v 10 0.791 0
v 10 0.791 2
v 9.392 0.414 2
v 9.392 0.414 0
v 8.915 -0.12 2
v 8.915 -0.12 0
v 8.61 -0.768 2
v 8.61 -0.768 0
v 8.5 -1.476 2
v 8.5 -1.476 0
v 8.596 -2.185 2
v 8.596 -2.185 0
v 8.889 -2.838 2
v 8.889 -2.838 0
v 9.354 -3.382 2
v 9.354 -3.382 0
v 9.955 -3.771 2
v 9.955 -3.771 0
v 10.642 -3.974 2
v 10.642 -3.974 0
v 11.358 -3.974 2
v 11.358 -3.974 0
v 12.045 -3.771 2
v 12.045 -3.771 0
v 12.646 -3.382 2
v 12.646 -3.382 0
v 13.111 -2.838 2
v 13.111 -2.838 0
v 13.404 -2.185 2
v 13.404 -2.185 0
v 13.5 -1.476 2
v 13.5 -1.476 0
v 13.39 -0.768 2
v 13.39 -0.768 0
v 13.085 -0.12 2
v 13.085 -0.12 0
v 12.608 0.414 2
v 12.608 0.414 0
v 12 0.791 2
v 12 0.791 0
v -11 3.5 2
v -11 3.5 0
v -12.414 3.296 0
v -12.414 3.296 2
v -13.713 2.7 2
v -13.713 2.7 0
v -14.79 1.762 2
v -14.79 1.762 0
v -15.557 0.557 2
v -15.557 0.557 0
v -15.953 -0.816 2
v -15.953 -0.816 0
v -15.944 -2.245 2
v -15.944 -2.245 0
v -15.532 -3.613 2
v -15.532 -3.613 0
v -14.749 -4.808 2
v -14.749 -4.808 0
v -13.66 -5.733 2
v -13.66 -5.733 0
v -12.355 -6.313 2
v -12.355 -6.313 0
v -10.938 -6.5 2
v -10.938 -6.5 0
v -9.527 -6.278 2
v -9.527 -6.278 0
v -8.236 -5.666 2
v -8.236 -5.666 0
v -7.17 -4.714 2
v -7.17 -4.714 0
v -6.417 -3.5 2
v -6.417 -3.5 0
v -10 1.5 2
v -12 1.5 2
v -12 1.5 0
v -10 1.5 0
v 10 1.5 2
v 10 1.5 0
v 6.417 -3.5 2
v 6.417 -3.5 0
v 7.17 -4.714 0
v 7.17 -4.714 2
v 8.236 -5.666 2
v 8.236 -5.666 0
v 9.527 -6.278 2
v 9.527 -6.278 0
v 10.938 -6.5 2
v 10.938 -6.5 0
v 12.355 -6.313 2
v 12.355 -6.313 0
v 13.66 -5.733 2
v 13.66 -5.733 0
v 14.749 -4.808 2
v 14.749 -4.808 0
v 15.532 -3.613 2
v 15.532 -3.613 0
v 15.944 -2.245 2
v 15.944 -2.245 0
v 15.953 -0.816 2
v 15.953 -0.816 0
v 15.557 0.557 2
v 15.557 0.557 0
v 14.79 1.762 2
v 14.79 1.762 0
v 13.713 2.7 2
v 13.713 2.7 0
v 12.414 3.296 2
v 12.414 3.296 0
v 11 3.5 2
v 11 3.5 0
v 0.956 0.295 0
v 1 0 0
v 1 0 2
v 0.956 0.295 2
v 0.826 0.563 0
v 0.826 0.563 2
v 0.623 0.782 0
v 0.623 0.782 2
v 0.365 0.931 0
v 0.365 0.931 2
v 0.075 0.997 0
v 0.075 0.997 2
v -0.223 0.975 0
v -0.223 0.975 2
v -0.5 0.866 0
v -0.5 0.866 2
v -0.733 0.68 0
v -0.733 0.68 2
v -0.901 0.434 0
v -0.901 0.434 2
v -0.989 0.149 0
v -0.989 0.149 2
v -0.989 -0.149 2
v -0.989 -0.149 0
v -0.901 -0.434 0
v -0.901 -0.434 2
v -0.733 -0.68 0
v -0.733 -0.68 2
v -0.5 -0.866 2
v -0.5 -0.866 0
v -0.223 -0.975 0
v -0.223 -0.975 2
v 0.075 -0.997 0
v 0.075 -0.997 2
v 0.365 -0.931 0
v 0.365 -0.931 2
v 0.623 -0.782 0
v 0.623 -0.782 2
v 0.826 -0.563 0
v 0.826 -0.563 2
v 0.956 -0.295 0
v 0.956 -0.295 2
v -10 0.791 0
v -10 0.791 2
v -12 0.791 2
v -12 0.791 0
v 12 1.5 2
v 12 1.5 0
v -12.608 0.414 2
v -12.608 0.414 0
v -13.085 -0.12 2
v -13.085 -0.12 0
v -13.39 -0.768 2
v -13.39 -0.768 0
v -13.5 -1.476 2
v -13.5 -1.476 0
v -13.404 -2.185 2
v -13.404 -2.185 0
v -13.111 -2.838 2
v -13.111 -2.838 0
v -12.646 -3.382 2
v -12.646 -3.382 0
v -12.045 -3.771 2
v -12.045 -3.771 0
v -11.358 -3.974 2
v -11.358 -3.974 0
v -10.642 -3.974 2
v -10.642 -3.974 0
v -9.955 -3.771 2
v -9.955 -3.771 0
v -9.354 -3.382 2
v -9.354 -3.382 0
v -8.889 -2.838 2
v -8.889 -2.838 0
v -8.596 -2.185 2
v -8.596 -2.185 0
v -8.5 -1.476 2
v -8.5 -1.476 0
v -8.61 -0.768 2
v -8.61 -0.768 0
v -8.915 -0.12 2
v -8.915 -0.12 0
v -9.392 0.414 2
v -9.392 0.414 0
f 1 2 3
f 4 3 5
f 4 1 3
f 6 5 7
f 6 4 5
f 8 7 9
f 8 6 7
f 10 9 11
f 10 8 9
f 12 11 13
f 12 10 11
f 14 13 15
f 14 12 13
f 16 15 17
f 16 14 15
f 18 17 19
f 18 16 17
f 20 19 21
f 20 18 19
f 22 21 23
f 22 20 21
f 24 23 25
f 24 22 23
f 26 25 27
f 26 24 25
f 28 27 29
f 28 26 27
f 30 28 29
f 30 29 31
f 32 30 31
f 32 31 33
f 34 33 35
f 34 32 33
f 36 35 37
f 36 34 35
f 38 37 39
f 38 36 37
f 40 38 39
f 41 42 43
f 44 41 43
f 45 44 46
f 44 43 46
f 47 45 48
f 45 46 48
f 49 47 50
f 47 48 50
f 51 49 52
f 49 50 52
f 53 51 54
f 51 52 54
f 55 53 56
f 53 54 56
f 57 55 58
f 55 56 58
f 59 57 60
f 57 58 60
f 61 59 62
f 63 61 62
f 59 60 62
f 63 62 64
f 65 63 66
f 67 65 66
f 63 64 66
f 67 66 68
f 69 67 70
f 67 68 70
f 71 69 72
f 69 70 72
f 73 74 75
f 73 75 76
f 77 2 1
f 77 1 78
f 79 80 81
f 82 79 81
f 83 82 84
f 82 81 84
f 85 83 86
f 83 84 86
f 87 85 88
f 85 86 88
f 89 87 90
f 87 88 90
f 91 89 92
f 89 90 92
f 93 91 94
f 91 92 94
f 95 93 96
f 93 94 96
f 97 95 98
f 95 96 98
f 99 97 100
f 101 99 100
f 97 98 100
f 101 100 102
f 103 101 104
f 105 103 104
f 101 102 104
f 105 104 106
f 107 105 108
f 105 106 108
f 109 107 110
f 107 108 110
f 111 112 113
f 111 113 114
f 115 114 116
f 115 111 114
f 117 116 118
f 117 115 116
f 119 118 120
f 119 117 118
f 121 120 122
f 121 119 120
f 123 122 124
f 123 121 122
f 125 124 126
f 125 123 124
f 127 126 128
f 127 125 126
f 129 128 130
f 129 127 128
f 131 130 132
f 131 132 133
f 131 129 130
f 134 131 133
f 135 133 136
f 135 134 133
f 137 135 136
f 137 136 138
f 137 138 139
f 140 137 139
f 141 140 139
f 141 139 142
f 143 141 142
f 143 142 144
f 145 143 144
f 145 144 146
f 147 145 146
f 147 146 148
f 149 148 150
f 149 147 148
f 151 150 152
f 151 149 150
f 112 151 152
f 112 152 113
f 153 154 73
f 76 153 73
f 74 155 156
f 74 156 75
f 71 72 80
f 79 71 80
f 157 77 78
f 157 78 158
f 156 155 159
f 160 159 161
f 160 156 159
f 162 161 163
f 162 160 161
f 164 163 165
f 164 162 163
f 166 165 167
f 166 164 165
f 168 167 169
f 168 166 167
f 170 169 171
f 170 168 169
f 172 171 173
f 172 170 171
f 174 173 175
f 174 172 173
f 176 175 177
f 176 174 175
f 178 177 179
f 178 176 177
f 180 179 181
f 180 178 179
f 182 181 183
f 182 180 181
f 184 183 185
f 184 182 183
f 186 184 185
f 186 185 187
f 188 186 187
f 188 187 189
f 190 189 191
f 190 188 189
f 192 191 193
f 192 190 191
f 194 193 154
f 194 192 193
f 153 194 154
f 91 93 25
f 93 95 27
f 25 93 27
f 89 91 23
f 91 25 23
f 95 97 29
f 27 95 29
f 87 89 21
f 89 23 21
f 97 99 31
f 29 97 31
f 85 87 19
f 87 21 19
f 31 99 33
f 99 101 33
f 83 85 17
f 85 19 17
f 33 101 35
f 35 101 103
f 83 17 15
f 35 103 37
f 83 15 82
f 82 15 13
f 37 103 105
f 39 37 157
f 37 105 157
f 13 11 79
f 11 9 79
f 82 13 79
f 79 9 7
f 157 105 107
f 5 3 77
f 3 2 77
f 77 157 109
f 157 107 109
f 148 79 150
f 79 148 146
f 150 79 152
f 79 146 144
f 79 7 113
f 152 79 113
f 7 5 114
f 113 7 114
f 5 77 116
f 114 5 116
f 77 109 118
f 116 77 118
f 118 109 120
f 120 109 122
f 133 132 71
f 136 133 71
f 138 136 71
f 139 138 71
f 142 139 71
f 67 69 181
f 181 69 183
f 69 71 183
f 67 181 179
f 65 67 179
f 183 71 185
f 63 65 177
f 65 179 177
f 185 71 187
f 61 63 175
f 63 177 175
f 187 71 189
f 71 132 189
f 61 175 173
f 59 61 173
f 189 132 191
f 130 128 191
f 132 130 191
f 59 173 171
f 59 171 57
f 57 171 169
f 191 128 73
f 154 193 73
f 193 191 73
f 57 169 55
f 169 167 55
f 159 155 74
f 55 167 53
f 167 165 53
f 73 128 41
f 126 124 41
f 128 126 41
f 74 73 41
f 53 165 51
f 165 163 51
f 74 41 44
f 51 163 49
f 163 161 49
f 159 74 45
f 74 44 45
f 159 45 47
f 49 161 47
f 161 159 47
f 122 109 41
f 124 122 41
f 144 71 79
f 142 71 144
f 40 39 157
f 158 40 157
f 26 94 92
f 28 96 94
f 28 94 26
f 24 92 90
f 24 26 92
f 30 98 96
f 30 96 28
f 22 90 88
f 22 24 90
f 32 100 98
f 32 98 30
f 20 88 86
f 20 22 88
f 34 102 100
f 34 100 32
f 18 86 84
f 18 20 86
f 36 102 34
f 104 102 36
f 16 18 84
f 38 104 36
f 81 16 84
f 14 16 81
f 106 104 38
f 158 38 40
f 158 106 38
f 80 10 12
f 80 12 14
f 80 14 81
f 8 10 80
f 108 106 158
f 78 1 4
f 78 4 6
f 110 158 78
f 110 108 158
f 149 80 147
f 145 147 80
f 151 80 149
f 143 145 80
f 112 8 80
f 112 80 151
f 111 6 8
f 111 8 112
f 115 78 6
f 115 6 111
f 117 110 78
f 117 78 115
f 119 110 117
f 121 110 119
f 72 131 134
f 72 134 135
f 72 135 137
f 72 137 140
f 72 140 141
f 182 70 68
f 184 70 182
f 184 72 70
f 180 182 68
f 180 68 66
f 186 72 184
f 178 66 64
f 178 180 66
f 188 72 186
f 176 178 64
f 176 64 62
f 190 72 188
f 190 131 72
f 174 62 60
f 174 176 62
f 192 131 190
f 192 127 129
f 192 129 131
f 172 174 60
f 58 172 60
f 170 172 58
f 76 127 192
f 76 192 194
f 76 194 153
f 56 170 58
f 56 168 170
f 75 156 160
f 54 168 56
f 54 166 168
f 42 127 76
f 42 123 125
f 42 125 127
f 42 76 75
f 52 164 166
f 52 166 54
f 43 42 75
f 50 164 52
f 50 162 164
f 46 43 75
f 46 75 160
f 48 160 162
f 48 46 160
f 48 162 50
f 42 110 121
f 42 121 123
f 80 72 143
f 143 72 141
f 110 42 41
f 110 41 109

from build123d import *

# Parameters (mm, degrees)
SKETCH_R     = 1
SKETCH_R_2   = 2.5
PAD_DEPTH    = 2
SKETCH001_W  = 2
SKETCH001_H  = 2
POCKET_DEPTH = 2.001


with BuildPart() as part:
    # Sketch → Pad (new body)
    with BuildSketch(Plane.XY):
        with BuildLine():
            Line((-11, 3.5), (11, 3.5))
            ThreePointArc((6.417424, -3.5), (15.1833, -4.238613), (11, 3.5))
            Line((-6.417424, -3.5), (6.417424, -3.5))
            ThreePointArc((-11, 3.5), (-15.1833, -4.238613), (-6.417424, -3.5))
        make_face()
        Circle(SKETCH_R, mode=Mode.SUBTRACT)
        with Locations((-11, -1.5)):
            Circle(SKETCH_R_2, mode=Mode.SUBTRACT)
        with Locations((11, -1.5)):
            Circle(SKETCH_R_2, mode=Mode.SUBTRACT)
    extrude(amount=PAD_DEPTH)

    # Sketch001 → Pocket (cut, through all)
    with BuildSketch(Plane.XY.offset(2)):
        with Locations((-11, 0.5)):
            Rectangle(SKETCH001_W, SKETCH001_H)
        with Locations((11, 0.5)):
            Rectangle(SKETCH001_W, SKETCH001_H)
    extrude(amount=-POCKET_DEPTH, mode=Mode.SUBTRACT)


solid = part.part
